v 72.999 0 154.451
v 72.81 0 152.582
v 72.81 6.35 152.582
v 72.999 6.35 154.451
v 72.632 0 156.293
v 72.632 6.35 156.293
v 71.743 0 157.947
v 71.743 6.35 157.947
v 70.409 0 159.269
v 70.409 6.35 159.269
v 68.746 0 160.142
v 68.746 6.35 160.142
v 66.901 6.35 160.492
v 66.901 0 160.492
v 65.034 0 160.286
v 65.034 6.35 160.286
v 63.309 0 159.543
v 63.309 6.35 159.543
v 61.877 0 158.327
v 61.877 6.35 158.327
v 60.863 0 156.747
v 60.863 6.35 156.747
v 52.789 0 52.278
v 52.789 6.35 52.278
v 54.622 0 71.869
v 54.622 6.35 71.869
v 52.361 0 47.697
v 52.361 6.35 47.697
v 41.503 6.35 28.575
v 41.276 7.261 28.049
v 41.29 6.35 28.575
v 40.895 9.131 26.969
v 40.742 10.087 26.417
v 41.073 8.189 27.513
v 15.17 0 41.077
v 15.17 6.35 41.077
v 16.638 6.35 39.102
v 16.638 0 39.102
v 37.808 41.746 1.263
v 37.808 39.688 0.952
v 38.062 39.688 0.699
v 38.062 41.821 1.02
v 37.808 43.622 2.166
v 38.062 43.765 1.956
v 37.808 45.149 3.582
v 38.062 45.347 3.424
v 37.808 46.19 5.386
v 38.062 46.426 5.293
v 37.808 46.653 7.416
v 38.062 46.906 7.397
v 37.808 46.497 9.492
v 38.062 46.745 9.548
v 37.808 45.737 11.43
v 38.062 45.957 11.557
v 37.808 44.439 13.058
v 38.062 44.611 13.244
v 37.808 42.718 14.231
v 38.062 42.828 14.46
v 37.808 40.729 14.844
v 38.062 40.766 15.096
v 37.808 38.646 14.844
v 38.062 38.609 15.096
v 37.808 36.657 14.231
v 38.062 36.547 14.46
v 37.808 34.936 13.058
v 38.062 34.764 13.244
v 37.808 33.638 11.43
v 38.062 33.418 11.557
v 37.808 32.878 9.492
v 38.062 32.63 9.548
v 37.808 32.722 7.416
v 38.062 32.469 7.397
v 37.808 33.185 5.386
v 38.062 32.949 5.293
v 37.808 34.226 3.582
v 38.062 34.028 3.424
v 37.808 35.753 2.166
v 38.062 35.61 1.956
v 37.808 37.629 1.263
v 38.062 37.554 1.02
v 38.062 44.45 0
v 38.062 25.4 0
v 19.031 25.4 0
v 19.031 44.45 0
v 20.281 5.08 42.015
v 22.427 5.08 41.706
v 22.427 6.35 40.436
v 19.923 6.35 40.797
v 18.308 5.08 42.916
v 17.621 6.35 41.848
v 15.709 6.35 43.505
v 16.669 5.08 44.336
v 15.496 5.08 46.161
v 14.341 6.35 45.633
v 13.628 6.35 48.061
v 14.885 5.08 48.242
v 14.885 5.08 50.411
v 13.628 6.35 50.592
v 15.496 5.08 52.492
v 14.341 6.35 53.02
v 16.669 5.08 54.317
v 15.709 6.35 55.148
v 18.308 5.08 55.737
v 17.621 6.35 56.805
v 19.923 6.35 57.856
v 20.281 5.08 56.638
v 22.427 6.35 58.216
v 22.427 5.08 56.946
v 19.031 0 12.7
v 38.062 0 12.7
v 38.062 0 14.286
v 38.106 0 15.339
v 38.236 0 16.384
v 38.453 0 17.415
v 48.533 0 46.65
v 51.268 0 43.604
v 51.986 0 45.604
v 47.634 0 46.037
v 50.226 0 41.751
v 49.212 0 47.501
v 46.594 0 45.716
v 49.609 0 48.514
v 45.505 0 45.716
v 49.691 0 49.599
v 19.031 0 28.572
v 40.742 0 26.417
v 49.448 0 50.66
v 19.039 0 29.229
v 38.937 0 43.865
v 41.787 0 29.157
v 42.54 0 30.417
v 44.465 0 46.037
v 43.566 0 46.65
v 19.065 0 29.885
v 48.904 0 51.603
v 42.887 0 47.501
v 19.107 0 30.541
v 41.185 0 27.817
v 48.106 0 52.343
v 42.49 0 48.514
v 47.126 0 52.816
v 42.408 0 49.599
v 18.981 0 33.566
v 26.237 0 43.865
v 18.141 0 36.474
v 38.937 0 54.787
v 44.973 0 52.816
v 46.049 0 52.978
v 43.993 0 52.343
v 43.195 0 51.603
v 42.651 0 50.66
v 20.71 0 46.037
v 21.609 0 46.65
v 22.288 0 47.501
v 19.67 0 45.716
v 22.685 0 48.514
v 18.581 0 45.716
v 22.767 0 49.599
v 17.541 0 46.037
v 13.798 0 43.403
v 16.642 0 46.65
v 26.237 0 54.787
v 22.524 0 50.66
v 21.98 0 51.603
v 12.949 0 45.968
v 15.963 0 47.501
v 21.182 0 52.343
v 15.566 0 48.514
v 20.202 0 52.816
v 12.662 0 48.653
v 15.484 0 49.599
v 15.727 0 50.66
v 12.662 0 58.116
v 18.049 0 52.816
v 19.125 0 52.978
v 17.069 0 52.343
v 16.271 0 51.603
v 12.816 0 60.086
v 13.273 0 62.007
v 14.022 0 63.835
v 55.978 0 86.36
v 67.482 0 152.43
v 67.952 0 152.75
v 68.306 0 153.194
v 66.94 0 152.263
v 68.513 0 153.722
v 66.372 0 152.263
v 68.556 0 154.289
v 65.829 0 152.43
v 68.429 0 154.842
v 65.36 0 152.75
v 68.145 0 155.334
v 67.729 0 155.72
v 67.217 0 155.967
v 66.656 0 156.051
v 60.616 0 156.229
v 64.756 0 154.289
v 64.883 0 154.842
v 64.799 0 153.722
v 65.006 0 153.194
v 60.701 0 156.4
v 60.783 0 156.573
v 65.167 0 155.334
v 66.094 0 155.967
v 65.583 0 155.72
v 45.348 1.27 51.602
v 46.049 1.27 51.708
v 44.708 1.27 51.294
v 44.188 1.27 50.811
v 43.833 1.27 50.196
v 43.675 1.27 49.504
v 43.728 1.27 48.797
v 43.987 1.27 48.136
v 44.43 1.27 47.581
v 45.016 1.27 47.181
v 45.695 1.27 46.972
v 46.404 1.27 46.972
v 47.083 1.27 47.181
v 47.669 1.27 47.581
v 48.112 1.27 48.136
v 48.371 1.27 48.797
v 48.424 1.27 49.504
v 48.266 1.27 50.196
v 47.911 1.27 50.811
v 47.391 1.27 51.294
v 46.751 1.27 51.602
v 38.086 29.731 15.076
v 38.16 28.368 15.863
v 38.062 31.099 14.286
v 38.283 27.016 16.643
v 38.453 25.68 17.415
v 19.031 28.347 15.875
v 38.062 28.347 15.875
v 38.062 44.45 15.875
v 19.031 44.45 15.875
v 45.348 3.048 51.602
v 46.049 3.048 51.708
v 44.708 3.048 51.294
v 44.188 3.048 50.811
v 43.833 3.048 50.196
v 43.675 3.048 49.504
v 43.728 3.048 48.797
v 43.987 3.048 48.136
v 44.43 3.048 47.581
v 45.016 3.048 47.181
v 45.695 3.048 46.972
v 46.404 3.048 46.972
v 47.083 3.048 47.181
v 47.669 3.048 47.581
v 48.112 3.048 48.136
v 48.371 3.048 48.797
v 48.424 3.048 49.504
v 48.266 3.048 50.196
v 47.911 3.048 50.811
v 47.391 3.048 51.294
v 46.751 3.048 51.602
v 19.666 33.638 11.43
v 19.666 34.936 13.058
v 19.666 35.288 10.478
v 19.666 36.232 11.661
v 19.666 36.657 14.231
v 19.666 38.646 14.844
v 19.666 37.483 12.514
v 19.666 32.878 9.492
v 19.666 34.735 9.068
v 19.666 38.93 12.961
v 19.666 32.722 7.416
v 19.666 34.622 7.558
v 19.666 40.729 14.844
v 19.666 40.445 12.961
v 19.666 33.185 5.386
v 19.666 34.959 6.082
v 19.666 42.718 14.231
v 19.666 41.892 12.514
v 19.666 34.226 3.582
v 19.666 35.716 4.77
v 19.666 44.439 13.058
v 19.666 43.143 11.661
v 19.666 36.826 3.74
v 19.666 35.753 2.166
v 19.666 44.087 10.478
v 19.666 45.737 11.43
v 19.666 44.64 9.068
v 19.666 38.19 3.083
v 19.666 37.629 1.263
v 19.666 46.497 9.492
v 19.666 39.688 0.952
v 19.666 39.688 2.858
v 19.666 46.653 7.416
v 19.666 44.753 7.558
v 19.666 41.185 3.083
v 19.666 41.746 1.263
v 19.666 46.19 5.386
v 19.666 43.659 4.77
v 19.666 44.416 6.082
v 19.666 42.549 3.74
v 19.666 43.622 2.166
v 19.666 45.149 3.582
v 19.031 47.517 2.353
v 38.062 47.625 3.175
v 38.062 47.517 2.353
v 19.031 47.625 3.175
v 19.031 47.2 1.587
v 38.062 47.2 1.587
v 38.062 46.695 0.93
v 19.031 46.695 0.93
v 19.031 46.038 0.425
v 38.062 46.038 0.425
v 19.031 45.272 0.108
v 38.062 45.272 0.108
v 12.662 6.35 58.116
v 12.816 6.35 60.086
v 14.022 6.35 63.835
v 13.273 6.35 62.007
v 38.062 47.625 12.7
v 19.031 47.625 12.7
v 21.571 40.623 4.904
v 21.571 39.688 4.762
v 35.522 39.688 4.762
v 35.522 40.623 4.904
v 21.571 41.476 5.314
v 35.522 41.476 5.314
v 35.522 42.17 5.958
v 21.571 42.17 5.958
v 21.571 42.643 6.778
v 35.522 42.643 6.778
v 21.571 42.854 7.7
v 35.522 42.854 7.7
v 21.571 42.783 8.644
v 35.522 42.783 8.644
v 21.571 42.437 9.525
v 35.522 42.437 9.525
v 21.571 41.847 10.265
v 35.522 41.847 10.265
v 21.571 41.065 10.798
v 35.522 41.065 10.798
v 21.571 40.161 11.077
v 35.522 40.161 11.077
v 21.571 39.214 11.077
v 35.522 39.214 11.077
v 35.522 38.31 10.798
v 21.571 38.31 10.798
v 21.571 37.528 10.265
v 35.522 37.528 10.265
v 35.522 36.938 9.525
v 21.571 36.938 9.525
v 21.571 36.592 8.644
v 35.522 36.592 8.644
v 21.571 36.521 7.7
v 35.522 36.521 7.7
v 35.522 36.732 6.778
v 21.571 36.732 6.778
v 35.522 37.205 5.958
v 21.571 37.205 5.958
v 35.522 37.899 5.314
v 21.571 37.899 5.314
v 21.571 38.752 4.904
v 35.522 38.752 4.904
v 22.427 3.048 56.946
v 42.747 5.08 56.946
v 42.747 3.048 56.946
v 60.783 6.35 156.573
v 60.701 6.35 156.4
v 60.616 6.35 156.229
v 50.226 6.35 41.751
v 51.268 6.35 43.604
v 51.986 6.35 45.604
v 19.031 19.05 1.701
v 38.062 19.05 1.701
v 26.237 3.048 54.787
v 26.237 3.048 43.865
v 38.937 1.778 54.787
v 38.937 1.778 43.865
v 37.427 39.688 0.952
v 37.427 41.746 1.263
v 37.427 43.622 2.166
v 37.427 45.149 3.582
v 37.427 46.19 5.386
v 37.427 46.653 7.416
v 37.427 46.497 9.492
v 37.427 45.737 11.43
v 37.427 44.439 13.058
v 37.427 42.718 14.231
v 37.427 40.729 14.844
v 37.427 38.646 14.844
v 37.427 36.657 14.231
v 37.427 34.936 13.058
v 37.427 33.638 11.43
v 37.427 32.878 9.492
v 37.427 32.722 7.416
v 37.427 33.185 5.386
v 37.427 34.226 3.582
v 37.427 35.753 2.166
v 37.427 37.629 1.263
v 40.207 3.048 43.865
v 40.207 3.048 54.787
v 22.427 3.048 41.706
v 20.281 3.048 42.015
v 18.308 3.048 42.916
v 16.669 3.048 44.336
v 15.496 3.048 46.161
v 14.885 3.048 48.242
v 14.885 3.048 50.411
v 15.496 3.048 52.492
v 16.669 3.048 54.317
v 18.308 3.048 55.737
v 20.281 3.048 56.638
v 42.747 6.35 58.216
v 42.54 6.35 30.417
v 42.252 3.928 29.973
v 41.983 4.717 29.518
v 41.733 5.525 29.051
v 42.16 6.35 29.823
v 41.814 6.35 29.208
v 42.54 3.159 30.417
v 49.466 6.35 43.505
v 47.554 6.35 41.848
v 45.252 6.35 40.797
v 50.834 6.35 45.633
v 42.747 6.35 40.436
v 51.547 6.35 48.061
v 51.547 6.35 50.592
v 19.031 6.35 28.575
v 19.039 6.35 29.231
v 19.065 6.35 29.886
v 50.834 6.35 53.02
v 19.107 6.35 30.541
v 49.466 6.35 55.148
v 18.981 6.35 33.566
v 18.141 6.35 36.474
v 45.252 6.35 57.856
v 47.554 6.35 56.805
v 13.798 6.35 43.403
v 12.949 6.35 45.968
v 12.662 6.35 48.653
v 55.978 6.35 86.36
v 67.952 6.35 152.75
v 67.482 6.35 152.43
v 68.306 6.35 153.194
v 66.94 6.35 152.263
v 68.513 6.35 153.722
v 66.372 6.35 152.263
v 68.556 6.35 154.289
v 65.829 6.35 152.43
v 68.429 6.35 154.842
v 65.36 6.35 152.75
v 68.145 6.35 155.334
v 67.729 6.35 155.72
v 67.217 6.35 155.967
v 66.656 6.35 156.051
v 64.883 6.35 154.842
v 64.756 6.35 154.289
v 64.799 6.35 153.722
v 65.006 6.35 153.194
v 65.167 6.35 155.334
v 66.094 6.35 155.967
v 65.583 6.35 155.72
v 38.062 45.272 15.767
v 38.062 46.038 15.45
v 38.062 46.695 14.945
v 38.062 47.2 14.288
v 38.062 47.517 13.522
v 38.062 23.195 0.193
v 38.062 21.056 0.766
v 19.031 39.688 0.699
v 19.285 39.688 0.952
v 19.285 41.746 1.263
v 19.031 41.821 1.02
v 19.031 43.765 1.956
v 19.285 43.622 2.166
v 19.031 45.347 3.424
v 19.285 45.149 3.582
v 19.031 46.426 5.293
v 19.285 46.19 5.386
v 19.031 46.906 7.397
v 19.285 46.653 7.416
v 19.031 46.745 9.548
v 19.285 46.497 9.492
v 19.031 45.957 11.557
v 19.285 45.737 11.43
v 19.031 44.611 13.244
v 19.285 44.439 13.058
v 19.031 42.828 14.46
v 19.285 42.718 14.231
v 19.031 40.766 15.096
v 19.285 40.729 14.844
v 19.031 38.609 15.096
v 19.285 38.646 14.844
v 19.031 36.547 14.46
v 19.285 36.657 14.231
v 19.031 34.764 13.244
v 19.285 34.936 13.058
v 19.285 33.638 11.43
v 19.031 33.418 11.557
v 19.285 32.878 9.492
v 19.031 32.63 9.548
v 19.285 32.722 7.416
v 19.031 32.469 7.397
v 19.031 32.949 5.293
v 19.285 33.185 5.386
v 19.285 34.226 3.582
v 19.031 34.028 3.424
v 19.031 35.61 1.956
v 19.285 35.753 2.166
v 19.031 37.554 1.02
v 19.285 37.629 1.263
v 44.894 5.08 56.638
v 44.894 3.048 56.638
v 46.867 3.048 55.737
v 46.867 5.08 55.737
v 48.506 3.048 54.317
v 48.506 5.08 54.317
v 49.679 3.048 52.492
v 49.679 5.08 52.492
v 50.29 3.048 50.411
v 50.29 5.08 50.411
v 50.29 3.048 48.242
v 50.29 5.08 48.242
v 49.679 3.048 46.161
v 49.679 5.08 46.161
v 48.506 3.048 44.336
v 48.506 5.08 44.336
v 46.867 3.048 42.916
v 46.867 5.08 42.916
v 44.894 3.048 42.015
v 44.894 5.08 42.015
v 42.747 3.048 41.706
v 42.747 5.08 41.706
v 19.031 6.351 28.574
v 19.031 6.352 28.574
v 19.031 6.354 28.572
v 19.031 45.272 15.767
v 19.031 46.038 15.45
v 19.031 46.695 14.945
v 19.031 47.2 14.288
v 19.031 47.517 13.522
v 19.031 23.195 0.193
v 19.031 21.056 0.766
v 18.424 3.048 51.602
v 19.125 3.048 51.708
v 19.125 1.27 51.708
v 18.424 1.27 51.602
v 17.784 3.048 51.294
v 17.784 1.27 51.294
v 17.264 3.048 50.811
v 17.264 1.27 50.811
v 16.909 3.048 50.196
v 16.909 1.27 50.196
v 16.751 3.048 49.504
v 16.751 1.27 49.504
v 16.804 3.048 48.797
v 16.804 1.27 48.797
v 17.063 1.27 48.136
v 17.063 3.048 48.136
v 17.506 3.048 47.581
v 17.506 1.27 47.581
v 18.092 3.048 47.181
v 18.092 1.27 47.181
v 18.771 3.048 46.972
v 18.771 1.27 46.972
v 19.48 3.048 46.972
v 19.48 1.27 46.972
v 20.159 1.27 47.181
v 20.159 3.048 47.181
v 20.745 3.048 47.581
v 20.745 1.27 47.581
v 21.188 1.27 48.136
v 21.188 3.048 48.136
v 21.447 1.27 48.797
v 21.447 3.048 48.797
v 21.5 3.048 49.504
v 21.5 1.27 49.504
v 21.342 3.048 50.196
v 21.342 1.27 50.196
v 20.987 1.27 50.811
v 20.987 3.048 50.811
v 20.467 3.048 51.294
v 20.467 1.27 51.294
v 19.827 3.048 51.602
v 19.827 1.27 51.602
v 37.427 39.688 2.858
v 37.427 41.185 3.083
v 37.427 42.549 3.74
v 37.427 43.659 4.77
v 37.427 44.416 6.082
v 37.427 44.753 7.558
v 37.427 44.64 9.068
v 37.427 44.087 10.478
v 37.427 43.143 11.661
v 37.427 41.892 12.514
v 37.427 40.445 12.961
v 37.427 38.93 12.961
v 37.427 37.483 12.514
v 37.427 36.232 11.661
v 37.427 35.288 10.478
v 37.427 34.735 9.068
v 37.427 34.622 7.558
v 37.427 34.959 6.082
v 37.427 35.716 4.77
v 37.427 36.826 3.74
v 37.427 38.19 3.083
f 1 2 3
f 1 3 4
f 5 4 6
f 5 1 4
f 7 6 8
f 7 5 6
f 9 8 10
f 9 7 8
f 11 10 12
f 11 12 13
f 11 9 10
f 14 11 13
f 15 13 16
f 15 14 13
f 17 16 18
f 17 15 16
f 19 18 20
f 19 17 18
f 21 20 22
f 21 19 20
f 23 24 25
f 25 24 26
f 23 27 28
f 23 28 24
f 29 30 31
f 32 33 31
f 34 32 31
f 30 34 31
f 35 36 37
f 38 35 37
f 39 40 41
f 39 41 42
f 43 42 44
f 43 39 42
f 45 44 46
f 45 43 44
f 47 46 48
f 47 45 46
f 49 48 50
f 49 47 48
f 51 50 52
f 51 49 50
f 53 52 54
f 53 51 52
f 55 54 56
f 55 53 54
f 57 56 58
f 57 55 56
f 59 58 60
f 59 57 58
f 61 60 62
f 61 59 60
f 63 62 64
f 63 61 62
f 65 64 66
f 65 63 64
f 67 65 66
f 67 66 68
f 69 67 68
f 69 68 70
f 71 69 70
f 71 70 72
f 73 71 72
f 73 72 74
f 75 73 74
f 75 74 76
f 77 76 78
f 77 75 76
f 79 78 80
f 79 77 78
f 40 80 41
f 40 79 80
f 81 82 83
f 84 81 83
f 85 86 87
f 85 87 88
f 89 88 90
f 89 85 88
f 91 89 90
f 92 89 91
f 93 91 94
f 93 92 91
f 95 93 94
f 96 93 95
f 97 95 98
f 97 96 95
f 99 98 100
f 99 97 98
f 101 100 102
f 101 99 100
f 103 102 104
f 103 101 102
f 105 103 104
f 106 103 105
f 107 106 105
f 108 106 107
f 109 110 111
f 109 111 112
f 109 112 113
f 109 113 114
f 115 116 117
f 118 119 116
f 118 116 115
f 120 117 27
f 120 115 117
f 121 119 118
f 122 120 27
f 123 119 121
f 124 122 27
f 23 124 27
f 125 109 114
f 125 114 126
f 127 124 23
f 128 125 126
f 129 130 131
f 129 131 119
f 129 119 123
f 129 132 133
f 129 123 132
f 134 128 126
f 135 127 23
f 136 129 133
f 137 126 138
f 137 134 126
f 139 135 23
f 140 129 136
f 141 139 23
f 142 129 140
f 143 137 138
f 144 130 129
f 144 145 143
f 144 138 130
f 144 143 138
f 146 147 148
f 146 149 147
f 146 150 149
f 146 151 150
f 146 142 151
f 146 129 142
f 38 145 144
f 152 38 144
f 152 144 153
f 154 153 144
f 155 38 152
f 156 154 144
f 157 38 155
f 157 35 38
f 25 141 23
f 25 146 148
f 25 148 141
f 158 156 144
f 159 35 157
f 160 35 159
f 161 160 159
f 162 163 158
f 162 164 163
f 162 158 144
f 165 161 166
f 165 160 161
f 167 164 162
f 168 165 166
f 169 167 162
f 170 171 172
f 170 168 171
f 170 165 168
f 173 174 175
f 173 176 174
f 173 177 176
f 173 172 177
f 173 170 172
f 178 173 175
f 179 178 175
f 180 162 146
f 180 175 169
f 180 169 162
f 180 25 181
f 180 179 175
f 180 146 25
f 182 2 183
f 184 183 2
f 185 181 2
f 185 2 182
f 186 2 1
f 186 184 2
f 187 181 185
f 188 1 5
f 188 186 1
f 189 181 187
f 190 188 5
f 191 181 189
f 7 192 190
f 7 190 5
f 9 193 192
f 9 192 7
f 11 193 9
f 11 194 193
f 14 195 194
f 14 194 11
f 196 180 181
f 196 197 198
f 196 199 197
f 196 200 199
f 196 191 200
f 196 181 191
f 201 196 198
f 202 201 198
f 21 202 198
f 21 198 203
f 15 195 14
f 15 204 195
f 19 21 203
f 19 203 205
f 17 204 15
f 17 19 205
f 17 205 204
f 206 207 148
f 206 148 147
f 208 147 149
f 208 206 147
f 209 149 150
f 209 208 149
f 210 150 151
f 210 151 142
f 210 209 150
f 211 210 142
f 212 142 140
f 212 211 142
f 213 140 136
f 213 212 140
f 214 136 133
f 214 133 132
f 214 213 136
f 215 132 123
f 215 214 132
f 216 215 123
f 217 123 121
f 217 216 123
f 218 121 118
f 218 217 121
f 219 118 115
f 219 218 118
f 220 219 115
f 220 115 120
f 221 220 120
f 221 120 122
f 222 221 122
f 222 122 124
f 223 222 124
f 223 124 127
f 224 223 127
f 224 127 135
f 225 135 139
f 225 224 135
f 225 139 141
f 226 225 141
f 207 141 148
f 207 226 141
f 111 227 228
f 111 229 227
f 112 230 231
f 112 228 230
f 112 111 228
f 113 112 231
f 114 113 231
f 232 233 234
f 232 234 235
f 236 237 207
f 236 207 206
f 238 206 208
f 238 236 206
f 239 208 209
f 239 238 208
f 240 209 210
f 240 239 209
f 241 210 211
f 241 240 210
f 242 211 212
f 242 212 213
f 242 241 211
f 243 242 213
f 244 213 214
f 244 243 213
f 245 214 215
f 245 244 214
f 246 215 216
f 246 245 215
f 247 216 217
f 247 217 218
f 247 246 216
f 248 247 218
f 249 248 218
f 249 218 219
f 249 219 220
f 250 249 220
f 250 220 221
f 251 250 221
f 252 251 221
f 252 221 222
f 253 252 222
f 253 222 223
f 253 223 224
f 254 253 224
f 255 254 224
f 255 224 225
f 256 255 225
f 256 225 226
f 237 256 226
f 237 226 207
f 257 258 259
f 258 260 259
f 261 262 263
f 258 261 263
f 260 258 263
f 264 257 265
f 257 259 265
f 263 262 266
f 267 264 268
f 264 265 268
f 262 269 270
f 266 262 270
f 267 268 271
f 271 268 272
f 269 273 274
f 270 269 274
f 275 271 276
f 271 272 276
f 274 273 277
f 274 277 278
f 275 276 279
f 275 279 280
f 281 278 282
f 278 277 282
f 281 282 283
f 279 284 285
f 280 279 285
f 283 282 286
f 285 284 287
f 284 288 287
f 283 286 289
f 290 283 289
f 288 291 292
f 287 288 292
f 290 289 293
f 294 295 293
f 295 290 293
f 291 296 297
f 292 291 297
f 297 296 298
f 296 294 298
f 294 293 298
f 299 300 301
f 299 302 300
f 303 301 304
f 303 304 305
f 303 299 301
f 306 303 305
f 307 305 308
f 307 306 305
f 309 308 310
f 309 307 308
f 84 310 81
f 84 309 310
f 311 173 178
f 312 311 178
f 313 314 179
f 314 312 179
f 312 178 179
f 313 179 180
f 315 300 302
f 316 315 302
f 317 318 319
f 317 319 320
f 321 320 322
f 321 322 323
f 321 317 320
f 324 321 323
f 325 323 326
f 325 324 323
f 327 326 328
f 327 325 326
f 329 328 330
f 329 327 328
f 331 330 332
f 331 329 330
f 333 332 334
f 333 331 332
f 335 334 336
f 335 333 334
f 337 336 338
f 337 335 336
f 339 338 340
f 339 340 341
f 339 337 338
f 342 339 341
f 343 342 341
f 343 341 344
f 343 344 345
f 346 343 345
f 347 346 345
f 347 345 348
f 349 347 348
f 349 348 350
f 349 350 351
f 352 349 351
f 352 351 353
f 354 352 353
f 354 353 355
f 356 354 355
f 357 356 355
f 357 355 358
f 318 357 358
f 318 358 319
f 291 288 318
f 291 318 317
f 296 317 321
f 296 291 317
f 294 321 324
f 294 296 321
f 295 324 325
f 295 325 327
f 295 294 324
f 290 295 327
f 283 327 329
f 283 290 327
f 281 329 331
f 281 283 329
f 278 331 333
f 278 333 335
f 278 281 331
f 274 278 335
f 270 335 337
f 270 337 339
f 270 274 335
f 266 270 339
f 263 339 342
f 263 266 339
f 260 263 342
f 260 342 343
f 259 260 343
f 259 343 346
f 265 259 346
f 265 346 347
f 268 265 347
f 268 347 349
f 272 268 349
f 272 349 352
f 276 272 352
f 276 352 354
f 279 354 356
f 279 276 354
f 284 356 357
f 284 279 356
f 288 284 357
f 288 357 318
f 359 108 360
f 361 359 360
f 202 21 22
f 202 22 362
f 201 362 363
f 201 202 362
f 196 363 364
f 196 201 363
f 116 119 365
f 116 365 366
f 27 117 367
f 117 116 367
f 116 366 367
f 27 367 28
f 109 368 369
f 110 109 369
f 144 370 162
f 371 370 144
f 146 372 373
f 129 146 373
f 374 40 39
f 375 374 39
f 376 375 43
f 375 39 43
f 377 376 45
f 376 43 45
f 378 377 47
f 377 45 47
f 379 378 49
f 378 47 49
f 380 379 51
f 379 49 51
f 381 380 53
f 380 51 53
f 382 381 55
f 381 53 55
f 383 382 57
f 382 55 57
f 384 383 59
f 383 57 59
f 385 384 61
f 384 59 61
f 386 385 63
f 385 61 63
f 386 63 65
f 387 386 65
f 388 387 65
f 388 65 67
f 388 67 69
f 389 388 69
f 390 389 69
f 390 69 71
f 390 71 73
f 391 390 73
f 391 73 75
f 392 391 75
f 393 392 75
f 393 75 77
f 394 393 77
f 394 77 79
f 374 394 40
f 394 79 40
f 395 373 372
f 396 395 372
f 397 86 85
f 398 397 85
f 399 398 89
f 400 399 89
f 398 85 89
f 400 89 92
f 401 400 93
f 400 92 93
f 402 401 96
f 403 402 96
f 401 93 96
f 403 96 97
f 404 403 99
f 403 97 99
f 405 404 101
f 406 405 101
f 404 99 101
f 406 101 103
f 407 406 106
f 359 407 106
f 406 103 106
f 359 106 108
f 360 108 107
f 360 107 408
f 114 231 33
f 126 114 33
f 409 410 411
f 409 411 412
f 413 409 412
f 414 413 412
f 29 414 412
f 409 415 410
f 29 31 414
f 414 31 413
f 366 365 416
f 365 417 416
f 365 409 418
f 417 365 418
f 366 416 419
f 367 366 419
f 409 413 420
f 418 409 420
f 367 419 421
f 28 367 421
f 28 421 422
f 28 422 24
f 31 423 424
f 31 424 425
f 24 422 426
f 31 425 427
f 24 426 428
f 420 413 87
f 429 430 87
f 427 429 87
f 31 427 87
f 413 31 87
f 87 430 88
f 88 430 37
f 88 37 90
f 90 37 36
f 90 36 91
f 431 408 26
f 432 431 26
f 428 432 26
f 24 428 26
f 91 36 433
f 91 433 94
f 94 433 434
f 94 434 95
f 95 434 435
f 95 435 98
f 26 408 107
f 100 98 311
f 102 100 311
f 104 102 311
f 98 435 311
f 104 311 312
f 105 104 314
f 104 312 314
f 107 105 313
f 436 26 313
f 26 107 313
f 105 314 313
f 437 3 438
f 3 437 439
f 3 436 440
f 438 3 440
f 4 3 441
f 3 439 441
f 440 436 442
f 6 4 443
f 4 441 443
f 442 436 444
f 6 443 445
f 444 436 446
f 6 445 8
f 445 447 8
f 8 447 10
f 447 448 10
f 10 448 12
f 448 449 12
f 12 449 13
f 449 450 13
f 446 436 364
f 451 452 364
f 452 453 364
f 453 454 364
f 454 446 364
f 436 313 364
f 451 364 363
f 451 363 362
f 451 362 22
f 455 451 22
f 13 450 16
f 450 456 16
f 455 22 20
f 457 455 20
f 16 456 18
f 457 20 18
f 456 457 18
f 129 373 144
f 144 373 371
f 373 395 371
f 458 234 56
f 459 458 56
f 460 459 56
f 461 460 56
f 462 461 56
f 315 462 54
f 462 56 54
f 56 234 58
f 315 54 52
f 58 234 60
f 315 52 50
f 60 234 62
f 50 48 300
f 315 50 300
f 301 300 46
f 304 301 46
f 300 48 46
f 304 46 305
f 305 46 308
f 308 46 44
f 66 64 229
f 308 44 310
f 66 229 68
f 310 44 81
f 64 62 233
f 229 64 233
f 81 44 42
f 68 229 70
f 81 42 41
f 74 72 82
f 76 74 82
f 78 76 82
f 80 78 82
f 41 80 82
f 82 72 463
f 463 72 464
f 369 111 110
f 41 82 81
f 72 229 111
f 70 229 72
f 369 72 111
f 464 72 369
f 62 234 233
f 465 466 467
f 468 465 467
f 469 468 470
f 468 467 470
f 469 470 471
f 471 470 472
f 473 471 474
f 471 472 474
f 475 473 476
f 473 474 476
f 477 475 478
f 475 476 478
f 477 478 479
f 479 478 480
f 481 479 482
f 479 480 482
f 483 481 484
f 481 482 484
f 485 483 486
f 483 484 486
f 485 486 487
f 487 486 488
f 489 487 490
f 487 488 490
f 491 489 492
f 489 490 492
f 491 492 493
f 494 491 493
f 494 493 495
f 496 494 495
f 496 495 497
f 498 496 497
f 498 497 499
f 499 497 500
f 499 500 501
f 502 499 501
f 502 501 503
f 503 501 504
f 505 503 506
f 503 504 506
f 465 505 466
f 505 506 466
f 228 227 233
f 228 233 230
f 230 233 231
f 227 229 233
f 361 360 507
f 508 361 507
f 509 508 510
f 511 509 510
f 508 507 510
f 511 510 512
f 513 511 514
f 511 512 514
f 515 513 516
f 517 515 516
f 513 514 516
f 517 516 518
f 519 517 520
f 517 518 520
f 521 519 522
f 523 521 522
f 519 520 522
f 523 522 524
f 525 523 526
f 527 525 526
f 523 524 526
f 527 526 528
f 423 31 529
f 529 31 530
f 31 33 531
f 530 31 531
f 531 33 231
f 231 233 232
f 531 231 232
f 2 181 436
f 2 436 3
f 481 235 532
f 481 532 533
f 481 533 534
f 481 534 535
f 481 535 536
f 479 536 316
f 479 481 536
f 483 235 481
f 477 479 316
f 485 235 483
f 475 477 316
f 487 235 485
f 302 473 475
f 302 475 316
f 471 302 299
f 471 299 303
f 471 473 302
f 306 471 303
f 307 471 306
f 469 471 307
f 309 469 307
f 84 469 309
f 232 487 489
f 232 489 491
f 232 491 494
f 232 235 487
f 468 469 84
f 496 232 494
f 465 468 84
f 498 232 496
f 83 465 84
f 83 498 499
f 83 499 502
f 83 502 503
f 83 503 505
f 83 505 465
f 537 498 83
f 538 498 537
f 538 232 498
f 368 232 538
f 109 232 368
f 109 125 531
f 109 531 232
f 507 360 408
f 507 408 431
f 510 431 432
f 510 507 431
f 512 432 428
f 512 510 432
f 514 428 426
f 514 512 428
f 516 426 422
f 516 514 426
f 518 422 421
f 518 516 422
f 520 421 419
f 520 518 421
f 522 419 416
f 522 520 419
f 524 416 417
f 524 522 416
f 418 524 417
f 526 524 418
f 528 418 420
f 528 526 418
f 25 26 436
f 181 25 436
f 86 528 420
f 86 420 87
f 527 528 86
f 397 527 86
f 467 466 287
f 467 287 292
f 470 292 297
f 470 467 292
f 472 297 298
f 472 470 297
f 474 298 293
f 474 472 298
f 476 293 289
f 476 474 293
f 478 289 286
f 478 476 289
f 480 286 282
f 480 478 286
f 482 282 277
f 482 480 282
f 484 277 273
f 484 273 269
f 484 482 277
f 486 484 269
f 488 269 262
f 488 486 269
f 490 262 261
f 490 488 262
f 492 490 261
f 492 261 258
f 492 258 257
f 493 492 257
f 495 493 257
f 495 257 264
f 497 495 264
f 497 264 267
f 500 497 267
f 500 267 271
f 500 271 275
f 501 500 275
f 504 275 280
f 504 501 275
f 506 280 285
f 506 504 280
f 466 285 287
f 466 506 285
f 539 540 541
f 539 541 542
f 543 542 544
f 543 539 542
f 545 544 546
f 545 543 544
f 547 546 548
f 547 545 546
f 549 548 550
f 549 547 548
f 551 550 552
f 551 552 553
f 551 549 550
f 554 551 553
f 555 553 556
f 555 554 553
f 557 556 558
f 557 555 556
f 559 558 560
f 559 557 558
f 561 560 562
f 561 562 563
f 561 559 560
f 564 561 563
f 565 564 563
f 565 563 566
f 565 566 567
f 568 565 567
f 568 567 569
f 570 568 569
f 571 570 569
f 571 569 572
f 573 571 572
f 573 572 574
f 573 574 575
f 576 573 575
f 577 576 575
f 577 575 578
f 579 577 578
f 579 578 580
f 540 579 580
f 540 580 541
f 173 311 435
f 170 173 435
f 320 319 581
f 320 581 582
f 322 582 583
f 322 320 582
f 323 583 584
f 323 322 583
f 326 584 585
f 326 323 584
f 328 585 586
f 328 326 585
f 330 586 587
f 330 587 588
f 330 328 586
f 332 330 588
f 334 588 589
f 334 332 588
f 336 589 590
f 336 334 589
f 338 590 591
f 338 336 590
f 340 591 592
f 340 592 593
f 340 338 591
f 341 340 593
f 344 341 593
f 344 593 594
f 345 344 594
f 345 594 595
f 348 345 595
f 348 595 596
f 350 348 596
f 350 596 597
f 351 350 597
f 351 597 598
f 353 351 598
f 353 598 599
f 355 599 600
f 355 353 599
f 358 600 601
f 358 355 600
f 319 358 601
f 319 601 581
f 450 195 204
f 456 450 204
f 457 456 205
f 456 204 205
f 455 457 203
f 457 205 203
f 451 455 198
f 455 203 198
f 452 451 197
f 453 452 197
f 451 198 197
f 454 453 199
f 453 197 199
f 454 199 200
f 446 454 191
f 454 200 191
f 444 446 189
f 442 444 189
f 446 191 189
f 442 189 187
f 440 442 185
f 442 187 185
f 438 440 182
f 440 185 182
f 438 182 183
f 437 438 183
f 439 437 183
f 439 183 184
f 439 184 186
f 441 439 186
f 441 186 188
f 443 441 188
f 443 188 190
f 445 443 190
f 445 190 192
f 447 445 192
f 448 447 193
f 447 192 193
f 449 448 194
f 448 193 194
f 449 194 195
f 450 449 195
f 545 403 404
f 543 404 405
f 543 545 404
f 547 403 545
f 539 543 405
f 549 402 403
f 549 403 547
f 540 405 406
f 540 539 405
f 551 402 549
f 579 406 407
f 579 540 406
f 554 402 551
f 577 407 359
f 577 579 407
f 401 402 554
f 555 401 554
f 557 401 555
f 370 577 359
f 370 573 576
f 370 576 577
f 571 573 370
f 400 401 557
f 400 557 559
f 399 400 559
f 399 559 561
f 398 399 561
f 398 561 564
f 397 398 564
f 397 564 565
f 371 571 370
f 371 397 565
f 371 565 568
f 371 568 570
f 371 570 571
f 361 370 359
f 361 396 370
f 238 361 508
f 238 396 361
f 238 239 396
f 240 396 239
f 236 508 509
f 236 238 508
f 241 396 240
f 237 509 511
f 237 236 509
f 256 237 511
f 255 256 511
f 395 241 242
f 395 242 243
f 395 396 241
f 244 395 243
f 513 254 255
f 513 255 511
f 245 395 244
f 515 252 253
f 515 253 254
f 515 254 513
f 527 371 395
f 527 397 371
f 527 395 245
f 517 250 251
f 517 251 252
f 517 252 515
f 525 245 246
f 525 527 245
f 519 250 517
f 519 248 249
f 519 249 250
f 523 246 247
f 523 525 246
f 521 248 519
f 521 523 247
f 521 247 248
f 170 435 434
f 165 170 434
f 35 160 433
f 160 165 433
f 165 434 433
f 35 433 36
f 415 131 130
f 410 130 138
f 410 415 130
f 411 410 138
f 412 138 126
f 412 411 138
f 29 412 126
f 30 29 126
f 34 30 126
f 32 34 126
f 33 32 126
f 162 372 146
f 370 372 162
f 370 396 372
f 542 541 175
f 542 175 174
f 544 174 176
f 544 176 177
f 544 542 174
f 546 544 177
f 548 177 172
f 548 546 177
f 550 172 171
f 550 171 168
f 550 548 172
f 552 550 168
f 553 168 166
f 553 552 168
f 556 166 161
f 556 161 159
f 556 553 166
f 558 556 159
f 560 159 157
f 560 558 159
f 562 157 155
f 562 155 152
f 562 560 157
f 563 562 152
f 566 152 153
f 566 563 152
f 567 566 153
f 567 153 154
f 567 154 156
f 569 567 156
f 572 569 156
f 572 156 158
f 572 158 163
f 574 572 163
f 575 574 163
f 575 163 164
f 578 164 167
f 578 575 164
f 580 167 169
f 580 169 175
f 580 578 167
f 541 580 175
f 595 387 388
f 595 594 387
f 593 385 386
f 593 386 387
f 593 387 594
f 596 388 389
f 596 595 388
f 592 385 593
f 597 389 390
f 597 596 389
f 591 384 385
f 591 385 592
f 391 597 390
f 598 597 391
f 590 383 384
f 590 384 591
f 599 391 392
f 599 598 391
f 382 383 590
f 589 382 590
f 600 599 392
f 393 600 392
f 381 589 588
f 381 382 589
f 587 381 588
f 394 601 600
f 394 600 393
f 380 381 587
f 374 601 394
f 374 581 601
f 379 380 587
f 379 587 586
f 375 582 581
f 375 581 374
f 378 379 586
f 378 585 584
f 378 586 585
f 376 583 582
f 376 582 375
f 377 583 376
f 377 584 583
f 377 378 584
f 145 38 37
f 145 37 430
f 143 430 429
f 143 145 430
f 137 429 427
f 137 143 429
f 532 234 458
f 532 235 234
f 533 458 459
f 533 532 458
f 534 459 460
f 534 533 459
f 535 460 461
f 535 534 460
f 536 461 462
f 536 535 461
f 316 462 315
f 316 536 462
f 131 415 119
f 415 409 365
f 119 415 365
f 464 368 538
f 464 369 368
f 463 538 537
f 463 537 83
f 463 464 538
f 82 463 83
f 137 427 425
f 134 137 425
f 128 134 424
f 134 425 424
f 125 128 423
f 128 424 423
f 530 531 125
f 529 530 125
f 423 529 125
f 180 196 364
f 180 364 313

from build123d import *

# Parameters (mm, degrees)
SKETCH1_R           = 6.35
SKETCH1_R_2         = 1.905
BOSS_EXTRUDE1_DEPTH = 6.35
FILLET2_R           = 25.4
SKETCH2_W           = 19.03095
SKETCH2_H           = 15.875
BOSS_EXTRUDE2_DEPTH = 41.275
SKETCH3_R           = 3.175
CUT_EXTRUDE1_DEPTH  = 176.899083324
SKETCH4_R           = 6.985
CUT_EXTRUDE2_DEPTH  = 0.635
CHAMFER1_SIZE       = 0.254
CHAMFER2_SIZE       = 1.905
FILLET3_R           = 3.175
CHAMFER3_SIZE       = 12.7
CHAMFER3_SIZE2      = 21.997045256
SKETCH6_R           = 1.905
BOSS_EXTRUDE3_DEPTH = 6.35
CUT_EXTRUDE3_DEPTH  = 6.35
FILLET4_R           = 6.35
CHAMFER5_SIZE       = 12.7
CHAMFER5_SIZE2      = 21.997045256
FILLET5_R           = 12.7
SKETCH7_R           = 1.905
BOSS_EXTRUDE4_DEPTH = 6.35
CUT_EXTRUDE4_DEPTH  = 170.362801463
CUT_EXTRUDE5_DEPTH  = 3.302
SKETCH10_3_R        = 2.38125
SKETCH10_3_W        = 12.7
SKETCH10_3_H        = 10.922
CUT_EXTRUDE6_DEPTH  = 170.362801463
CHAMFER6_SIZE       = 1.27
CHAMFER7_SIZE       = 1.27
CUT_EXTRUDE7_DEPTH  = 183.63914045
FILLET6_R           = 12.7


with BuildPart() as part:
    # Sketch1 → Boss-Extrude1 (new body)
    # profile 1 of 2: a face of its own
    with BuildSketch(Plane(origin=(0, 0, 0), x_dir=(1, 0, 0), z_dir=(0, 1, 0))):
        with BuildLine():
            Line((0, -15.875), (-34.748352364, -152.581941075))
            ThreePointArc((-34.748352364, -152.581941075), (-27.805798775, -147.845364348), (-22.24405, -154.14625))
            ThreePointArc((-22.24405, -154.14625), (-22.363673933, -155.372999389), (-22.718038681, -156.553528751))
            Line((-22.718038681, -156.553528751), (3.697461152, -92.075))
            Line((3.697461152, -92.075), (19.03095, -31.75))
            Line((19.03095, -31.75), (19.03095, 0))
            Line((19.03095, 0), (0, 0))
            Line((0, 0), (0, -15.875))
        make_face()
    # profile 2 of 2: a face of its own
    with BuildSketch(Plane(origin=(0, 0, 0), x_dir=(1, 0, 0), z_dir=(0, 1, 0))):
        with Locations((-28.59405, -154.14625)):
            Circle(SKETCH1_R)
        with Locations(Location((-28.59405, -154.14625, 0), (0, 0, 270))):
            Circle(SKETCH1_R_2, mode=Mode.SUBTRACT)
    extrude(amount=BOSS_EXTRUDE1_DEPTH)

    # Fillet2
    fillet2_edges = [part.edges().sort_by_distance(p)[0] for p in [
        (19.03095, 3.175, 31.75),
        (3.697461152, 3.175, 92.075),
    ]]
    fillet(fillet2_edges, radius=FILLET2_R)

    # Sketch2 → Boss-Extrude2 (add)
    with BuildSketch(Plane(origin=(0, 6.35, 0), x_dir=(1, 0, 0), z_dir=(0, 1, 0))):
        with Locations((9.515475, -7.9375)):
            Rectangle(SKETCH2_W, SKETCH2_H)
    extrude(amount=BOSS_EXTRUDE2_DEPTH)

    # Sketch3 → Cut-Extrude1 (cut, through all)
    with BuildSketch(Plane(origin=(19.03095, 0, 0), x_dir=(0, 0, -1), z_dir=(1, 0, 0))):
        with Locations((-7.9375, 39.6875)):
            Circle(SKETCH3_R)
    extrude(amount=-CUT_EXTRUDE1_DEPTH, mode=Mode.SUBTRACT)

    # Sketch4 → Cut-Extrude2 (cut)
    with BuildSketch(Plane(origin=(19.03095, 0, 0), x_dir=(0, 0, -1), z_dir=(1, 0, 0))):
        with Locations((-7.9375, 39.6875)):
            Circle(SKETCH4_R)
    cut_extrude2 = extrude(amount=-CUT_EXTRUDE2_DEPTH, mode=Mode.SUBTRACT)

    # Mirror1: Cut-Extrude2 across plane
    add(cut_extrude2.mirror(Plane(origin=(9.515475, 0, 0), x_dir=(0, 0, 1), z_dir=(1, 0, 0))), mode=Mode.SUBTRACT)

    # Chamfer1
    chamfer1_edges = [part.edges().sort_by_distance(p)[0] for p in [
        (19.03095, 39.6875, 14.9225),
        (0, 39.6875, 14.9225),
    ]]
    chamfer(chamfer1_edges, length=CHAMFER1_SIZE)

    # Chamfer2
    chamfer2_edges = [part.edges().sort_by_distance(p)[0] for p in [
        (18.39595, 39.6875, 11.1125),
        (0.635, 39.6875, 11.1125),
    ]]
    chamfer(chamfer2_edges, length=CHAMFER2_SIZE)

    # Fillet3
    fillet3_edges = [part.edges().sort_by_distance(p)[0] for p in [
        (9.515475, 47.625, 0),
        (9.515475, 47.625, 15.875),
    ]]
    fillet(fillet3_edges, radius=FILLET3_R)

    # Chamfer3
    chamfer3_edges = [part.edges().sort_by_distance(p)[0] for p in [
        (9.515475, 6.35, 15.875),
    ]]
    chamfer3_side = [part.faces().sort_by_distance(p)[0] for p in [
        (-6.326800104, 6.35, 82.033556201),
    ]]
    chamfer(chamfer3_edges, length=CHAMFER3_SIZE, length2=CHAMFER3_SIZE2, reference=chamfer3_side[0])

    # Sketch6 → Boss-Extrude3 (add)
    # profile 1 of 2: a face of its own
    with BuildSketch(Plane(origin=(0, 6.35, 0), x_dir=(1, 0, 0), z_dir=(0, 1, 0))):
        with BuildLine():
            Line((-8.255, -44.45), (-6.925228458, -43.120228458))
            Line((-6.925228458, -43.120228458), (-3.228102915, -28.575))
            Line((-3.228102915, -28.575), (-13.99495746, -44.45))
            Line((-13.99495746, -44.45), (-15.073361931, -55.976593532))
            ThreePointArc((-15.073361931, -55.976593532), (-20.292390061, -61.638490142), (-16.214172451, -68.17021801))
            Line((-16.214172451, -68.17021801), (-17.91597118, -86.36))
            Line((-17.91597118, -86.36), (-8.255, -48.351814634))
            Line((-8.255, -48.351814634), (-8.255, -44.45))
        make_face()
        with Locations(Location((-13.97, -62.23, 0), (0, 0, 270))):
            Circle(SKETCH6_R, mode=Mode.SUBTRACT)
    # profile 2 of 2: a face of its own
    with BuildSketch(Plane(origin=(0, 6.35, 0), x_dir=(1, 0, 0), z_dir=(0, 1, 0))):
        with BuildLine():
            Line((18.248159602, -34.82965338), (4.135908565, -90.350060527))
            ThreePointArc((4.135908565, -90.350060527), (3.638321539, -92.055476142), (3.022744588, -93.721939549))
            Line((3.022744588, -93.721939549), (-22.718038594, -156.553528537))
            Line((-22.718038594, -156.553528537), (25.4, -86.36))
            Line((25.4, -86.36), (25.4, -68.58))
            ThreePointArc((25.4, -68.58), (31.75, -62.23), (25.4, -55.88))
            Line((25.4, -55.88), (25.4, -44.45))
            Line((25.4, -44.45), (18.248159602, -34.82965338))
        make_face()
        with Locations(Location((25.4, -62.23, 0), (0, 0, 270))):
            Circle(SKETCH6_R, mode=Mode.SUBTRACT)
    extrude(amount=-BOSS_EXTRUDE3_DEPTH)

    # Sketch6<3> → Cut-Extrude3 (cut)
    with BuildSketch(Plane(origin=(0, 6.35, 0), x_dir=(1, 0, 0), z_dir=(0, 1, 0))):
        Polygon((-1.905, -38.1), (13.335, -38.1), (19.685, -44.45), (19.685, -86.36), (-8.255, -86.36), (-8.255, -44.45), align=None)
    extrude(amount=-CUT_EXTRUDE3_DEPTH, mode=Mode.SUBTRACT)

    # Fillet4
    fillet4_edges = [part.edges().sort_by_distance(p)[0] for p in [
        (25.4, 3.175, 55.88),
        (25.4, 3.175, 68.58),
        (25.4, 3.175, 86.36),
        (-16.214172451, 3.175, 68.17021801),
        (-15.073361931, 3.175, 55.976593532),
    ]]
    fillet(fillet4_edges, radius=FILLET4_R)

    # Chamfer5
    chamfer5_edges = [part.edges().sort_by_distance(p)[0] for p in [
        (9.515475, 0, 0),
    ]]
    chamfer5_side = [part.faces().sort_by_distance(p)[0] for p in [
        (-0.648785112, 0, 121.285485339),
    ]]
    chamfer(chamfer5_edges, length=CHAMFER5_SIZE, length2=CHAMFER5_SIZE2, reference=chamfer5_side[0])

    # Fillet5
    fillet5_edges = [part.edges().sort_by_distance(p)[0] for p in [
        (9.515475, 21.997045256, 0),
    ]]
    fillet(fillet5_edges, radius=FILLET5_R)

    # Sketch7 → Boss-Extrude4 (add)
    with BuildSketch(Plane(origin=(0, 6.35, 0), x_dir=(1, 0, 0), z_dir=(0, 1, 0))):
        with Locations((-13.97, -62.23)):
            Circle(SKETCH7_R)
        with Locations((25.4, -62.23)):
            Circle(SKETCH7_R)
        Polygon((-8.255, -86.36), (19.685, -86.36), (19.685, -44.45), (13.335, -38.1), (-1.905, -38.1), (-8.255, -44.45), align=None)
    extrude(amount=-BOSS_EXTRUDE4_DEPTH)

    # Sketch9 → Cut-Extrude4 (cut, through all)
    with BuildSketch(Plane(origin=(0, 6.35, 0), x_dir=(1, 0, 0), z_dir=(0, 1, 0))):
        with BuildLine():
            Line((-14.727319743, -52.277899988), (-16.560214639, -71.868911554))
            ThreePointArc((-16.560214639, -71.868911554), (-16.917171132, -69.101142904), (-18.42630235, -66.753700848))
            ThreePointArc((-18.42630235, -66.753700848), (-20.292390061, -61.638490142), (-17.509854902, -56.958195065))
            ThreePointArc((-17.509854902, -56.958195065), (-15.591481206, -54.931423346), (-14.727319743, -52.277899988))
        make_face()
        with BuildLine():
            Line((25.4, -73.228522628), (25.4, -51.231477372))
            ThreePointArc((25.4, -51.231477372), (26.250738686, -54.406477372), (28.575, -56.730738686))
            ThreePointArc((28.575, -56.730738686), (31.75, -62.23), (28.575, -67.729261314))
            ThreePointArc((28.575, -67.729261314), (26.250738686, -70.053522628), (25.4, -73.228522628))
        make_face()
    extrude(amount=-CUT_EXTRUDE4_DEPTH, mode=Mode.SUBTRACT)

    # Sketch10 → Cut-Extrude5 (cut)
    with BuildSketch(Plane(origin=(0, 6.35, 0), x_dir=(1, 0, 0), z_dir=(0, 1, 0))):
        with BuildLine():
            Line((-4.685595345, -41.706477372), (15.634404655, -41.706477372))
            ThreePointArc((15.634404655, -41.706477372), (23.254404655, -49.326477372), (15.634404655, -56.946477372))
            Line((15.634404655, -56.946477372), (-4.685595345, -56.946477372))
            ThreePointArc((-4.685595345, -56.946477372), (-12.305595345, -49.326477372), (-4.685595345, -41.706477372))
        make_face()
    extrude(amount=-CUT_EXTRUDE5_DEPTH, mode=Mode.SUBTRACT)

    # Sketch10<3> → Cut-Extrude6 (cut, through all)
    with BuildSketch(Plane(origin=(0, 6.35, 0), x_dir=(1, 0, 0), z_dir=(0, 1, 0))):
        with Locations(Location((-7.987595345, -49.326477372, 0), (0, 0, 270))):
            Circle(SKETCH10_3_R)
        with Locations((5.474404655, -49.326477372)):
            Rectangle(SKETCH10_3_W, SKETCH10_3_H)
        with Locations(Location((18.936404655, -49.326477372, 0), (0, 0, 270))):
            Circle(SKETCH10_3_R)
    extrude(amount=-CUT_EXTRUDE6_DEPTH, mode=Mode.SUBTRACT)

    # Chamfer6
    chamfer6_edges = [part.edges().sort_by_distance(p)[0] for p in [
        (5.474404655, 6.35, 41.706477372),
        (-12.305595345, 6.35, 49.326477372),
        (5.474404655, 6.35, 56.946477372),
        (23.254404655, 6.35, 49.326477372),
        (-0.875595345, 3.048, 49.326477372),
    ]]
    chamfer(chamfer6_edges, length=CHAMFER6_SIZE)

    # Chamfer7
    chamfer7_edges = [part.edges().sort_by_distance(p)[0] for p in [
        (-7.987595345, 0, 46.945227372),
        (18.936404655, 0, 46.945227372),
    ]]
    chamfer(chamfer7_edges, length=CHAMFER7_SIZE)


with BuildPart() as body_2:
    # Mirror2: read off the stored shape, not the designer's step
    # Mirror2: mirrored copy
    add(part.part.mirror(Plane.YZ.offset(19.03095)))

    # Sketch11 → Cut-Extrude7 (cut, through all)
    with BuildSketch(Plane.XZ):
        with BuildLine():
            Line((60.779938594, 156.553528537), (12.6619, 61.137477372))
            Line((12.6619, 61.137477372), (12.6619, 84.392473417))
            ThreePointArc((12.6619, 84.392473417), (12.946388069, 86.271852309), (13.774361424, 87.982834076))
            Line((13.774361424, 87.982834076), (60.779938594, 156.553528537))
        make_face()
    extrude(amount=-CUT_EXTRUDE7_DEPTH, mode=Mode.SUBTRACT)

    # Fillet6
    # the kernel refuses this fillet: 12.7 mm, written as the material it adds along each edge
    with BuildSketch(Plane(origin=(41.290002915, 11.915442624, 28.575), x_dir=(0.5613062559258853, 0, 0.8276081724212639), z_dir=(0, -1, 0))) as fillet6_piece_1_section:
        with BuildLine():
            CenterArc((FILLET6_R * 0.17528953146, -FILLET6_R), FILLET6_R, 90, 19.884681412)
            Line((-FILLET6_R * 0.164838611345, -FILLET6_R * 0.0596209027884), (0, 0))
            Line((0, 0), (FILLET6_R * 0.17528953146, 0))
        make_face()
    fillet6_piece_1 = extrude(amount=11.915442624, mode=Mode.PRIVATE)
    fillet6_piece_1 = split(fillet6_piece_1, bisect_by=Plane(origin=(41.290002915, 10.524081968, 26.165092652), z_dir=(0, -0.49999999999999806, -0.8660254037844398)), keep=Keep.TOP, mode=Mode.PRIVATE)
    add(fillet6_piece_1)
    with BuildSketch(Plane(origin=(41.290002915, 6.35, 28.575), x_dir=(0.5613062559258853, 0, 0.8276081724212639), z_dir=(0, -1, 0))) as fillet6_piece_2_section:
        with BuildLine():
            CenterArc((FILLET6_R * 0.17528953146, -FILLET6_R), FILLET6_R, 90, 19.884681412)
            Line((-FILLET6_R * 0.164838611345, -FILLET6_R * 0.0596209027884), (0, 0))
            Line((0, 0), (FILLET6_R * 0.17528953146, 0))
        make_face()
    fillet6_piece_2 = extrude(amount=11.915442624, mode=Mode.PRIVATE)
    fillet6_piece_2 = split(fillet6_piece_2, bisect_by=Plane(origin=(41.290002915, 6.35, 28.575), z_dir=(0, 0.49999999999999806, 0.8660254037844398)), keep=Keep.TOP, mode=Mode.PRIVATE)
    add(fillet6_piece_2)
    with BuildSketch(Plane(origin=(38.0619, 0, 15.875), x_dir=(0.24634783955161182, 0, 0.9691814803989258), z_dir=(0, 1, 0))) as fillet6_piece_3_section:
        with BuildLine():
            CenterArc((FILLET6_R * 0.125101643502, FILLET6_R), FILLET6_R, 255.73849915, 14.26150085)
            Line((-FILLET6_R * 0.12124619605, FILLET6_R * 0.0308185196011), (0, 0))
            Line((0, 0), (FILLET6_R * 0.125101643502, 0))
        make_face()
    fillet6_piece_3 = extrude(amount=32.319022437, mode=Mode.PRIVATE)
    fillet6_piece_3 = split(fillet6_piece_3, bisect_by=Plane(origin=(38.0619, 7.086761314, 28.149630657), z_dir=(0, -0.49999999999999806, -0.8660254037844398)), keep=Keep.TOP, mode=Mode.PRIVATE)
    add(fillet6_piece_3)
    with BuildSketch(Plane(origin=(60.779938681, 0, 156.553528751), x_dir=(-0.4502803833327004, 0, -0.892887213698212), z_dir=(0, 1, 0))) as fillet6_piece_4:
        with BuildLine():
            CenterArc((0.363846893, 12.7), FILLET6_R, 267.411723266, 2.588279583)
            ThreePointArc((-0.209667177, 0.012956152), (-0.104780009, 0.007345146), (0, 0))
            Line((0, 0), (0.363847525, 0))
        make_face()
    extrude(amount=6.35)
    with BuildSketch(Plane(origin=(19.813740398, 0, 34.82965338), x_dir=(-0.1625178407980129, 0, -0.9867056052452279), z_dir=(0, 1, 0))) as fillet6_piece_5:
        with BuildLine():
            CenterArc((5.433283049, 12.653425521), FILLET6_R, 224.019529776, 41.072040405)
            Line((-3.699324772, 3.828150773), (0, 0))
            ThreePointArc((0, 0), (2.17331322, 0.093148958), (4.34662644, 0))
        make_face()
    extrude(amount=6.35)
    # the kernel refuses this fillet: 12.7 mm, written as the material it takes off along each edge
    with BuildSketch(Plane(origin=(12.6619, 16.858731076, 44.45), x_dir=(0.5966087190088384, 0, -0.8025322650228044), z_dir=(0, -1, 0))) as fillet6_2_piece_1:
        with BuildLine():
            CenterArc((FILLET6_R * 0.33098365593, FILLET6_R), FILLET6_R, 233.372600808, 36.627399192)
            Line((-FILLET6_R * 0.265625063079, FILLET6_R * 0.197467734977), (0, 0))
            Line((0, 0), (FILLET6_R * 0.33098365593, 0))
        make_face()
    extrude(amount=27.367462152, mode=Mode.SUBTRACT)
    with BuildSketch(Plane(origin=(52.05685746, 14.502388088, 44.45), x_dir=(0.0931511588181929, 0, 0.9956519781584466), z_dir=(0, -1, 0))) as fillet6_2_piece_2:
        with BuildLine():
            CenterArc((FILLET6_R * 0.25676812876, FILLET6_R), FILLET6_R, 241.198734849, 28.801265151)
            Line((-FILLET6_R * 0.225004894996, FILLET6_R * 0.123703957797), (0, 0))
            Line((0, 0), (FILLET6_R * 0.25676812876, 0))
        make_face()
    extrude(amount=22.654776176, mode=Mode.SUBTRACT)
    with BuildSketch(Plane(origin=(12.6619, -7.55269709, 61.137477372), x_dir=(0, 0, -1), z_dir=(0, 1, 0))) as fillet6_2_piece_3:
        with BuildLine():
            CenterArc((FILLET6_R * 0.237880223292, -FILLET6_R), FILLET6_R, 90, 26.761677325)
            Line((-FILLET6_R * 0.212400204442, -FILLET6_R * 0.107112808693), (0, 0))
            Line((0, 0), (FILLET6_R * 0.237880223292, 0))
        make_face()
    extrude(amount=21.455394179, mode=Mode.SUBTRACT)


solid = body_2.part
